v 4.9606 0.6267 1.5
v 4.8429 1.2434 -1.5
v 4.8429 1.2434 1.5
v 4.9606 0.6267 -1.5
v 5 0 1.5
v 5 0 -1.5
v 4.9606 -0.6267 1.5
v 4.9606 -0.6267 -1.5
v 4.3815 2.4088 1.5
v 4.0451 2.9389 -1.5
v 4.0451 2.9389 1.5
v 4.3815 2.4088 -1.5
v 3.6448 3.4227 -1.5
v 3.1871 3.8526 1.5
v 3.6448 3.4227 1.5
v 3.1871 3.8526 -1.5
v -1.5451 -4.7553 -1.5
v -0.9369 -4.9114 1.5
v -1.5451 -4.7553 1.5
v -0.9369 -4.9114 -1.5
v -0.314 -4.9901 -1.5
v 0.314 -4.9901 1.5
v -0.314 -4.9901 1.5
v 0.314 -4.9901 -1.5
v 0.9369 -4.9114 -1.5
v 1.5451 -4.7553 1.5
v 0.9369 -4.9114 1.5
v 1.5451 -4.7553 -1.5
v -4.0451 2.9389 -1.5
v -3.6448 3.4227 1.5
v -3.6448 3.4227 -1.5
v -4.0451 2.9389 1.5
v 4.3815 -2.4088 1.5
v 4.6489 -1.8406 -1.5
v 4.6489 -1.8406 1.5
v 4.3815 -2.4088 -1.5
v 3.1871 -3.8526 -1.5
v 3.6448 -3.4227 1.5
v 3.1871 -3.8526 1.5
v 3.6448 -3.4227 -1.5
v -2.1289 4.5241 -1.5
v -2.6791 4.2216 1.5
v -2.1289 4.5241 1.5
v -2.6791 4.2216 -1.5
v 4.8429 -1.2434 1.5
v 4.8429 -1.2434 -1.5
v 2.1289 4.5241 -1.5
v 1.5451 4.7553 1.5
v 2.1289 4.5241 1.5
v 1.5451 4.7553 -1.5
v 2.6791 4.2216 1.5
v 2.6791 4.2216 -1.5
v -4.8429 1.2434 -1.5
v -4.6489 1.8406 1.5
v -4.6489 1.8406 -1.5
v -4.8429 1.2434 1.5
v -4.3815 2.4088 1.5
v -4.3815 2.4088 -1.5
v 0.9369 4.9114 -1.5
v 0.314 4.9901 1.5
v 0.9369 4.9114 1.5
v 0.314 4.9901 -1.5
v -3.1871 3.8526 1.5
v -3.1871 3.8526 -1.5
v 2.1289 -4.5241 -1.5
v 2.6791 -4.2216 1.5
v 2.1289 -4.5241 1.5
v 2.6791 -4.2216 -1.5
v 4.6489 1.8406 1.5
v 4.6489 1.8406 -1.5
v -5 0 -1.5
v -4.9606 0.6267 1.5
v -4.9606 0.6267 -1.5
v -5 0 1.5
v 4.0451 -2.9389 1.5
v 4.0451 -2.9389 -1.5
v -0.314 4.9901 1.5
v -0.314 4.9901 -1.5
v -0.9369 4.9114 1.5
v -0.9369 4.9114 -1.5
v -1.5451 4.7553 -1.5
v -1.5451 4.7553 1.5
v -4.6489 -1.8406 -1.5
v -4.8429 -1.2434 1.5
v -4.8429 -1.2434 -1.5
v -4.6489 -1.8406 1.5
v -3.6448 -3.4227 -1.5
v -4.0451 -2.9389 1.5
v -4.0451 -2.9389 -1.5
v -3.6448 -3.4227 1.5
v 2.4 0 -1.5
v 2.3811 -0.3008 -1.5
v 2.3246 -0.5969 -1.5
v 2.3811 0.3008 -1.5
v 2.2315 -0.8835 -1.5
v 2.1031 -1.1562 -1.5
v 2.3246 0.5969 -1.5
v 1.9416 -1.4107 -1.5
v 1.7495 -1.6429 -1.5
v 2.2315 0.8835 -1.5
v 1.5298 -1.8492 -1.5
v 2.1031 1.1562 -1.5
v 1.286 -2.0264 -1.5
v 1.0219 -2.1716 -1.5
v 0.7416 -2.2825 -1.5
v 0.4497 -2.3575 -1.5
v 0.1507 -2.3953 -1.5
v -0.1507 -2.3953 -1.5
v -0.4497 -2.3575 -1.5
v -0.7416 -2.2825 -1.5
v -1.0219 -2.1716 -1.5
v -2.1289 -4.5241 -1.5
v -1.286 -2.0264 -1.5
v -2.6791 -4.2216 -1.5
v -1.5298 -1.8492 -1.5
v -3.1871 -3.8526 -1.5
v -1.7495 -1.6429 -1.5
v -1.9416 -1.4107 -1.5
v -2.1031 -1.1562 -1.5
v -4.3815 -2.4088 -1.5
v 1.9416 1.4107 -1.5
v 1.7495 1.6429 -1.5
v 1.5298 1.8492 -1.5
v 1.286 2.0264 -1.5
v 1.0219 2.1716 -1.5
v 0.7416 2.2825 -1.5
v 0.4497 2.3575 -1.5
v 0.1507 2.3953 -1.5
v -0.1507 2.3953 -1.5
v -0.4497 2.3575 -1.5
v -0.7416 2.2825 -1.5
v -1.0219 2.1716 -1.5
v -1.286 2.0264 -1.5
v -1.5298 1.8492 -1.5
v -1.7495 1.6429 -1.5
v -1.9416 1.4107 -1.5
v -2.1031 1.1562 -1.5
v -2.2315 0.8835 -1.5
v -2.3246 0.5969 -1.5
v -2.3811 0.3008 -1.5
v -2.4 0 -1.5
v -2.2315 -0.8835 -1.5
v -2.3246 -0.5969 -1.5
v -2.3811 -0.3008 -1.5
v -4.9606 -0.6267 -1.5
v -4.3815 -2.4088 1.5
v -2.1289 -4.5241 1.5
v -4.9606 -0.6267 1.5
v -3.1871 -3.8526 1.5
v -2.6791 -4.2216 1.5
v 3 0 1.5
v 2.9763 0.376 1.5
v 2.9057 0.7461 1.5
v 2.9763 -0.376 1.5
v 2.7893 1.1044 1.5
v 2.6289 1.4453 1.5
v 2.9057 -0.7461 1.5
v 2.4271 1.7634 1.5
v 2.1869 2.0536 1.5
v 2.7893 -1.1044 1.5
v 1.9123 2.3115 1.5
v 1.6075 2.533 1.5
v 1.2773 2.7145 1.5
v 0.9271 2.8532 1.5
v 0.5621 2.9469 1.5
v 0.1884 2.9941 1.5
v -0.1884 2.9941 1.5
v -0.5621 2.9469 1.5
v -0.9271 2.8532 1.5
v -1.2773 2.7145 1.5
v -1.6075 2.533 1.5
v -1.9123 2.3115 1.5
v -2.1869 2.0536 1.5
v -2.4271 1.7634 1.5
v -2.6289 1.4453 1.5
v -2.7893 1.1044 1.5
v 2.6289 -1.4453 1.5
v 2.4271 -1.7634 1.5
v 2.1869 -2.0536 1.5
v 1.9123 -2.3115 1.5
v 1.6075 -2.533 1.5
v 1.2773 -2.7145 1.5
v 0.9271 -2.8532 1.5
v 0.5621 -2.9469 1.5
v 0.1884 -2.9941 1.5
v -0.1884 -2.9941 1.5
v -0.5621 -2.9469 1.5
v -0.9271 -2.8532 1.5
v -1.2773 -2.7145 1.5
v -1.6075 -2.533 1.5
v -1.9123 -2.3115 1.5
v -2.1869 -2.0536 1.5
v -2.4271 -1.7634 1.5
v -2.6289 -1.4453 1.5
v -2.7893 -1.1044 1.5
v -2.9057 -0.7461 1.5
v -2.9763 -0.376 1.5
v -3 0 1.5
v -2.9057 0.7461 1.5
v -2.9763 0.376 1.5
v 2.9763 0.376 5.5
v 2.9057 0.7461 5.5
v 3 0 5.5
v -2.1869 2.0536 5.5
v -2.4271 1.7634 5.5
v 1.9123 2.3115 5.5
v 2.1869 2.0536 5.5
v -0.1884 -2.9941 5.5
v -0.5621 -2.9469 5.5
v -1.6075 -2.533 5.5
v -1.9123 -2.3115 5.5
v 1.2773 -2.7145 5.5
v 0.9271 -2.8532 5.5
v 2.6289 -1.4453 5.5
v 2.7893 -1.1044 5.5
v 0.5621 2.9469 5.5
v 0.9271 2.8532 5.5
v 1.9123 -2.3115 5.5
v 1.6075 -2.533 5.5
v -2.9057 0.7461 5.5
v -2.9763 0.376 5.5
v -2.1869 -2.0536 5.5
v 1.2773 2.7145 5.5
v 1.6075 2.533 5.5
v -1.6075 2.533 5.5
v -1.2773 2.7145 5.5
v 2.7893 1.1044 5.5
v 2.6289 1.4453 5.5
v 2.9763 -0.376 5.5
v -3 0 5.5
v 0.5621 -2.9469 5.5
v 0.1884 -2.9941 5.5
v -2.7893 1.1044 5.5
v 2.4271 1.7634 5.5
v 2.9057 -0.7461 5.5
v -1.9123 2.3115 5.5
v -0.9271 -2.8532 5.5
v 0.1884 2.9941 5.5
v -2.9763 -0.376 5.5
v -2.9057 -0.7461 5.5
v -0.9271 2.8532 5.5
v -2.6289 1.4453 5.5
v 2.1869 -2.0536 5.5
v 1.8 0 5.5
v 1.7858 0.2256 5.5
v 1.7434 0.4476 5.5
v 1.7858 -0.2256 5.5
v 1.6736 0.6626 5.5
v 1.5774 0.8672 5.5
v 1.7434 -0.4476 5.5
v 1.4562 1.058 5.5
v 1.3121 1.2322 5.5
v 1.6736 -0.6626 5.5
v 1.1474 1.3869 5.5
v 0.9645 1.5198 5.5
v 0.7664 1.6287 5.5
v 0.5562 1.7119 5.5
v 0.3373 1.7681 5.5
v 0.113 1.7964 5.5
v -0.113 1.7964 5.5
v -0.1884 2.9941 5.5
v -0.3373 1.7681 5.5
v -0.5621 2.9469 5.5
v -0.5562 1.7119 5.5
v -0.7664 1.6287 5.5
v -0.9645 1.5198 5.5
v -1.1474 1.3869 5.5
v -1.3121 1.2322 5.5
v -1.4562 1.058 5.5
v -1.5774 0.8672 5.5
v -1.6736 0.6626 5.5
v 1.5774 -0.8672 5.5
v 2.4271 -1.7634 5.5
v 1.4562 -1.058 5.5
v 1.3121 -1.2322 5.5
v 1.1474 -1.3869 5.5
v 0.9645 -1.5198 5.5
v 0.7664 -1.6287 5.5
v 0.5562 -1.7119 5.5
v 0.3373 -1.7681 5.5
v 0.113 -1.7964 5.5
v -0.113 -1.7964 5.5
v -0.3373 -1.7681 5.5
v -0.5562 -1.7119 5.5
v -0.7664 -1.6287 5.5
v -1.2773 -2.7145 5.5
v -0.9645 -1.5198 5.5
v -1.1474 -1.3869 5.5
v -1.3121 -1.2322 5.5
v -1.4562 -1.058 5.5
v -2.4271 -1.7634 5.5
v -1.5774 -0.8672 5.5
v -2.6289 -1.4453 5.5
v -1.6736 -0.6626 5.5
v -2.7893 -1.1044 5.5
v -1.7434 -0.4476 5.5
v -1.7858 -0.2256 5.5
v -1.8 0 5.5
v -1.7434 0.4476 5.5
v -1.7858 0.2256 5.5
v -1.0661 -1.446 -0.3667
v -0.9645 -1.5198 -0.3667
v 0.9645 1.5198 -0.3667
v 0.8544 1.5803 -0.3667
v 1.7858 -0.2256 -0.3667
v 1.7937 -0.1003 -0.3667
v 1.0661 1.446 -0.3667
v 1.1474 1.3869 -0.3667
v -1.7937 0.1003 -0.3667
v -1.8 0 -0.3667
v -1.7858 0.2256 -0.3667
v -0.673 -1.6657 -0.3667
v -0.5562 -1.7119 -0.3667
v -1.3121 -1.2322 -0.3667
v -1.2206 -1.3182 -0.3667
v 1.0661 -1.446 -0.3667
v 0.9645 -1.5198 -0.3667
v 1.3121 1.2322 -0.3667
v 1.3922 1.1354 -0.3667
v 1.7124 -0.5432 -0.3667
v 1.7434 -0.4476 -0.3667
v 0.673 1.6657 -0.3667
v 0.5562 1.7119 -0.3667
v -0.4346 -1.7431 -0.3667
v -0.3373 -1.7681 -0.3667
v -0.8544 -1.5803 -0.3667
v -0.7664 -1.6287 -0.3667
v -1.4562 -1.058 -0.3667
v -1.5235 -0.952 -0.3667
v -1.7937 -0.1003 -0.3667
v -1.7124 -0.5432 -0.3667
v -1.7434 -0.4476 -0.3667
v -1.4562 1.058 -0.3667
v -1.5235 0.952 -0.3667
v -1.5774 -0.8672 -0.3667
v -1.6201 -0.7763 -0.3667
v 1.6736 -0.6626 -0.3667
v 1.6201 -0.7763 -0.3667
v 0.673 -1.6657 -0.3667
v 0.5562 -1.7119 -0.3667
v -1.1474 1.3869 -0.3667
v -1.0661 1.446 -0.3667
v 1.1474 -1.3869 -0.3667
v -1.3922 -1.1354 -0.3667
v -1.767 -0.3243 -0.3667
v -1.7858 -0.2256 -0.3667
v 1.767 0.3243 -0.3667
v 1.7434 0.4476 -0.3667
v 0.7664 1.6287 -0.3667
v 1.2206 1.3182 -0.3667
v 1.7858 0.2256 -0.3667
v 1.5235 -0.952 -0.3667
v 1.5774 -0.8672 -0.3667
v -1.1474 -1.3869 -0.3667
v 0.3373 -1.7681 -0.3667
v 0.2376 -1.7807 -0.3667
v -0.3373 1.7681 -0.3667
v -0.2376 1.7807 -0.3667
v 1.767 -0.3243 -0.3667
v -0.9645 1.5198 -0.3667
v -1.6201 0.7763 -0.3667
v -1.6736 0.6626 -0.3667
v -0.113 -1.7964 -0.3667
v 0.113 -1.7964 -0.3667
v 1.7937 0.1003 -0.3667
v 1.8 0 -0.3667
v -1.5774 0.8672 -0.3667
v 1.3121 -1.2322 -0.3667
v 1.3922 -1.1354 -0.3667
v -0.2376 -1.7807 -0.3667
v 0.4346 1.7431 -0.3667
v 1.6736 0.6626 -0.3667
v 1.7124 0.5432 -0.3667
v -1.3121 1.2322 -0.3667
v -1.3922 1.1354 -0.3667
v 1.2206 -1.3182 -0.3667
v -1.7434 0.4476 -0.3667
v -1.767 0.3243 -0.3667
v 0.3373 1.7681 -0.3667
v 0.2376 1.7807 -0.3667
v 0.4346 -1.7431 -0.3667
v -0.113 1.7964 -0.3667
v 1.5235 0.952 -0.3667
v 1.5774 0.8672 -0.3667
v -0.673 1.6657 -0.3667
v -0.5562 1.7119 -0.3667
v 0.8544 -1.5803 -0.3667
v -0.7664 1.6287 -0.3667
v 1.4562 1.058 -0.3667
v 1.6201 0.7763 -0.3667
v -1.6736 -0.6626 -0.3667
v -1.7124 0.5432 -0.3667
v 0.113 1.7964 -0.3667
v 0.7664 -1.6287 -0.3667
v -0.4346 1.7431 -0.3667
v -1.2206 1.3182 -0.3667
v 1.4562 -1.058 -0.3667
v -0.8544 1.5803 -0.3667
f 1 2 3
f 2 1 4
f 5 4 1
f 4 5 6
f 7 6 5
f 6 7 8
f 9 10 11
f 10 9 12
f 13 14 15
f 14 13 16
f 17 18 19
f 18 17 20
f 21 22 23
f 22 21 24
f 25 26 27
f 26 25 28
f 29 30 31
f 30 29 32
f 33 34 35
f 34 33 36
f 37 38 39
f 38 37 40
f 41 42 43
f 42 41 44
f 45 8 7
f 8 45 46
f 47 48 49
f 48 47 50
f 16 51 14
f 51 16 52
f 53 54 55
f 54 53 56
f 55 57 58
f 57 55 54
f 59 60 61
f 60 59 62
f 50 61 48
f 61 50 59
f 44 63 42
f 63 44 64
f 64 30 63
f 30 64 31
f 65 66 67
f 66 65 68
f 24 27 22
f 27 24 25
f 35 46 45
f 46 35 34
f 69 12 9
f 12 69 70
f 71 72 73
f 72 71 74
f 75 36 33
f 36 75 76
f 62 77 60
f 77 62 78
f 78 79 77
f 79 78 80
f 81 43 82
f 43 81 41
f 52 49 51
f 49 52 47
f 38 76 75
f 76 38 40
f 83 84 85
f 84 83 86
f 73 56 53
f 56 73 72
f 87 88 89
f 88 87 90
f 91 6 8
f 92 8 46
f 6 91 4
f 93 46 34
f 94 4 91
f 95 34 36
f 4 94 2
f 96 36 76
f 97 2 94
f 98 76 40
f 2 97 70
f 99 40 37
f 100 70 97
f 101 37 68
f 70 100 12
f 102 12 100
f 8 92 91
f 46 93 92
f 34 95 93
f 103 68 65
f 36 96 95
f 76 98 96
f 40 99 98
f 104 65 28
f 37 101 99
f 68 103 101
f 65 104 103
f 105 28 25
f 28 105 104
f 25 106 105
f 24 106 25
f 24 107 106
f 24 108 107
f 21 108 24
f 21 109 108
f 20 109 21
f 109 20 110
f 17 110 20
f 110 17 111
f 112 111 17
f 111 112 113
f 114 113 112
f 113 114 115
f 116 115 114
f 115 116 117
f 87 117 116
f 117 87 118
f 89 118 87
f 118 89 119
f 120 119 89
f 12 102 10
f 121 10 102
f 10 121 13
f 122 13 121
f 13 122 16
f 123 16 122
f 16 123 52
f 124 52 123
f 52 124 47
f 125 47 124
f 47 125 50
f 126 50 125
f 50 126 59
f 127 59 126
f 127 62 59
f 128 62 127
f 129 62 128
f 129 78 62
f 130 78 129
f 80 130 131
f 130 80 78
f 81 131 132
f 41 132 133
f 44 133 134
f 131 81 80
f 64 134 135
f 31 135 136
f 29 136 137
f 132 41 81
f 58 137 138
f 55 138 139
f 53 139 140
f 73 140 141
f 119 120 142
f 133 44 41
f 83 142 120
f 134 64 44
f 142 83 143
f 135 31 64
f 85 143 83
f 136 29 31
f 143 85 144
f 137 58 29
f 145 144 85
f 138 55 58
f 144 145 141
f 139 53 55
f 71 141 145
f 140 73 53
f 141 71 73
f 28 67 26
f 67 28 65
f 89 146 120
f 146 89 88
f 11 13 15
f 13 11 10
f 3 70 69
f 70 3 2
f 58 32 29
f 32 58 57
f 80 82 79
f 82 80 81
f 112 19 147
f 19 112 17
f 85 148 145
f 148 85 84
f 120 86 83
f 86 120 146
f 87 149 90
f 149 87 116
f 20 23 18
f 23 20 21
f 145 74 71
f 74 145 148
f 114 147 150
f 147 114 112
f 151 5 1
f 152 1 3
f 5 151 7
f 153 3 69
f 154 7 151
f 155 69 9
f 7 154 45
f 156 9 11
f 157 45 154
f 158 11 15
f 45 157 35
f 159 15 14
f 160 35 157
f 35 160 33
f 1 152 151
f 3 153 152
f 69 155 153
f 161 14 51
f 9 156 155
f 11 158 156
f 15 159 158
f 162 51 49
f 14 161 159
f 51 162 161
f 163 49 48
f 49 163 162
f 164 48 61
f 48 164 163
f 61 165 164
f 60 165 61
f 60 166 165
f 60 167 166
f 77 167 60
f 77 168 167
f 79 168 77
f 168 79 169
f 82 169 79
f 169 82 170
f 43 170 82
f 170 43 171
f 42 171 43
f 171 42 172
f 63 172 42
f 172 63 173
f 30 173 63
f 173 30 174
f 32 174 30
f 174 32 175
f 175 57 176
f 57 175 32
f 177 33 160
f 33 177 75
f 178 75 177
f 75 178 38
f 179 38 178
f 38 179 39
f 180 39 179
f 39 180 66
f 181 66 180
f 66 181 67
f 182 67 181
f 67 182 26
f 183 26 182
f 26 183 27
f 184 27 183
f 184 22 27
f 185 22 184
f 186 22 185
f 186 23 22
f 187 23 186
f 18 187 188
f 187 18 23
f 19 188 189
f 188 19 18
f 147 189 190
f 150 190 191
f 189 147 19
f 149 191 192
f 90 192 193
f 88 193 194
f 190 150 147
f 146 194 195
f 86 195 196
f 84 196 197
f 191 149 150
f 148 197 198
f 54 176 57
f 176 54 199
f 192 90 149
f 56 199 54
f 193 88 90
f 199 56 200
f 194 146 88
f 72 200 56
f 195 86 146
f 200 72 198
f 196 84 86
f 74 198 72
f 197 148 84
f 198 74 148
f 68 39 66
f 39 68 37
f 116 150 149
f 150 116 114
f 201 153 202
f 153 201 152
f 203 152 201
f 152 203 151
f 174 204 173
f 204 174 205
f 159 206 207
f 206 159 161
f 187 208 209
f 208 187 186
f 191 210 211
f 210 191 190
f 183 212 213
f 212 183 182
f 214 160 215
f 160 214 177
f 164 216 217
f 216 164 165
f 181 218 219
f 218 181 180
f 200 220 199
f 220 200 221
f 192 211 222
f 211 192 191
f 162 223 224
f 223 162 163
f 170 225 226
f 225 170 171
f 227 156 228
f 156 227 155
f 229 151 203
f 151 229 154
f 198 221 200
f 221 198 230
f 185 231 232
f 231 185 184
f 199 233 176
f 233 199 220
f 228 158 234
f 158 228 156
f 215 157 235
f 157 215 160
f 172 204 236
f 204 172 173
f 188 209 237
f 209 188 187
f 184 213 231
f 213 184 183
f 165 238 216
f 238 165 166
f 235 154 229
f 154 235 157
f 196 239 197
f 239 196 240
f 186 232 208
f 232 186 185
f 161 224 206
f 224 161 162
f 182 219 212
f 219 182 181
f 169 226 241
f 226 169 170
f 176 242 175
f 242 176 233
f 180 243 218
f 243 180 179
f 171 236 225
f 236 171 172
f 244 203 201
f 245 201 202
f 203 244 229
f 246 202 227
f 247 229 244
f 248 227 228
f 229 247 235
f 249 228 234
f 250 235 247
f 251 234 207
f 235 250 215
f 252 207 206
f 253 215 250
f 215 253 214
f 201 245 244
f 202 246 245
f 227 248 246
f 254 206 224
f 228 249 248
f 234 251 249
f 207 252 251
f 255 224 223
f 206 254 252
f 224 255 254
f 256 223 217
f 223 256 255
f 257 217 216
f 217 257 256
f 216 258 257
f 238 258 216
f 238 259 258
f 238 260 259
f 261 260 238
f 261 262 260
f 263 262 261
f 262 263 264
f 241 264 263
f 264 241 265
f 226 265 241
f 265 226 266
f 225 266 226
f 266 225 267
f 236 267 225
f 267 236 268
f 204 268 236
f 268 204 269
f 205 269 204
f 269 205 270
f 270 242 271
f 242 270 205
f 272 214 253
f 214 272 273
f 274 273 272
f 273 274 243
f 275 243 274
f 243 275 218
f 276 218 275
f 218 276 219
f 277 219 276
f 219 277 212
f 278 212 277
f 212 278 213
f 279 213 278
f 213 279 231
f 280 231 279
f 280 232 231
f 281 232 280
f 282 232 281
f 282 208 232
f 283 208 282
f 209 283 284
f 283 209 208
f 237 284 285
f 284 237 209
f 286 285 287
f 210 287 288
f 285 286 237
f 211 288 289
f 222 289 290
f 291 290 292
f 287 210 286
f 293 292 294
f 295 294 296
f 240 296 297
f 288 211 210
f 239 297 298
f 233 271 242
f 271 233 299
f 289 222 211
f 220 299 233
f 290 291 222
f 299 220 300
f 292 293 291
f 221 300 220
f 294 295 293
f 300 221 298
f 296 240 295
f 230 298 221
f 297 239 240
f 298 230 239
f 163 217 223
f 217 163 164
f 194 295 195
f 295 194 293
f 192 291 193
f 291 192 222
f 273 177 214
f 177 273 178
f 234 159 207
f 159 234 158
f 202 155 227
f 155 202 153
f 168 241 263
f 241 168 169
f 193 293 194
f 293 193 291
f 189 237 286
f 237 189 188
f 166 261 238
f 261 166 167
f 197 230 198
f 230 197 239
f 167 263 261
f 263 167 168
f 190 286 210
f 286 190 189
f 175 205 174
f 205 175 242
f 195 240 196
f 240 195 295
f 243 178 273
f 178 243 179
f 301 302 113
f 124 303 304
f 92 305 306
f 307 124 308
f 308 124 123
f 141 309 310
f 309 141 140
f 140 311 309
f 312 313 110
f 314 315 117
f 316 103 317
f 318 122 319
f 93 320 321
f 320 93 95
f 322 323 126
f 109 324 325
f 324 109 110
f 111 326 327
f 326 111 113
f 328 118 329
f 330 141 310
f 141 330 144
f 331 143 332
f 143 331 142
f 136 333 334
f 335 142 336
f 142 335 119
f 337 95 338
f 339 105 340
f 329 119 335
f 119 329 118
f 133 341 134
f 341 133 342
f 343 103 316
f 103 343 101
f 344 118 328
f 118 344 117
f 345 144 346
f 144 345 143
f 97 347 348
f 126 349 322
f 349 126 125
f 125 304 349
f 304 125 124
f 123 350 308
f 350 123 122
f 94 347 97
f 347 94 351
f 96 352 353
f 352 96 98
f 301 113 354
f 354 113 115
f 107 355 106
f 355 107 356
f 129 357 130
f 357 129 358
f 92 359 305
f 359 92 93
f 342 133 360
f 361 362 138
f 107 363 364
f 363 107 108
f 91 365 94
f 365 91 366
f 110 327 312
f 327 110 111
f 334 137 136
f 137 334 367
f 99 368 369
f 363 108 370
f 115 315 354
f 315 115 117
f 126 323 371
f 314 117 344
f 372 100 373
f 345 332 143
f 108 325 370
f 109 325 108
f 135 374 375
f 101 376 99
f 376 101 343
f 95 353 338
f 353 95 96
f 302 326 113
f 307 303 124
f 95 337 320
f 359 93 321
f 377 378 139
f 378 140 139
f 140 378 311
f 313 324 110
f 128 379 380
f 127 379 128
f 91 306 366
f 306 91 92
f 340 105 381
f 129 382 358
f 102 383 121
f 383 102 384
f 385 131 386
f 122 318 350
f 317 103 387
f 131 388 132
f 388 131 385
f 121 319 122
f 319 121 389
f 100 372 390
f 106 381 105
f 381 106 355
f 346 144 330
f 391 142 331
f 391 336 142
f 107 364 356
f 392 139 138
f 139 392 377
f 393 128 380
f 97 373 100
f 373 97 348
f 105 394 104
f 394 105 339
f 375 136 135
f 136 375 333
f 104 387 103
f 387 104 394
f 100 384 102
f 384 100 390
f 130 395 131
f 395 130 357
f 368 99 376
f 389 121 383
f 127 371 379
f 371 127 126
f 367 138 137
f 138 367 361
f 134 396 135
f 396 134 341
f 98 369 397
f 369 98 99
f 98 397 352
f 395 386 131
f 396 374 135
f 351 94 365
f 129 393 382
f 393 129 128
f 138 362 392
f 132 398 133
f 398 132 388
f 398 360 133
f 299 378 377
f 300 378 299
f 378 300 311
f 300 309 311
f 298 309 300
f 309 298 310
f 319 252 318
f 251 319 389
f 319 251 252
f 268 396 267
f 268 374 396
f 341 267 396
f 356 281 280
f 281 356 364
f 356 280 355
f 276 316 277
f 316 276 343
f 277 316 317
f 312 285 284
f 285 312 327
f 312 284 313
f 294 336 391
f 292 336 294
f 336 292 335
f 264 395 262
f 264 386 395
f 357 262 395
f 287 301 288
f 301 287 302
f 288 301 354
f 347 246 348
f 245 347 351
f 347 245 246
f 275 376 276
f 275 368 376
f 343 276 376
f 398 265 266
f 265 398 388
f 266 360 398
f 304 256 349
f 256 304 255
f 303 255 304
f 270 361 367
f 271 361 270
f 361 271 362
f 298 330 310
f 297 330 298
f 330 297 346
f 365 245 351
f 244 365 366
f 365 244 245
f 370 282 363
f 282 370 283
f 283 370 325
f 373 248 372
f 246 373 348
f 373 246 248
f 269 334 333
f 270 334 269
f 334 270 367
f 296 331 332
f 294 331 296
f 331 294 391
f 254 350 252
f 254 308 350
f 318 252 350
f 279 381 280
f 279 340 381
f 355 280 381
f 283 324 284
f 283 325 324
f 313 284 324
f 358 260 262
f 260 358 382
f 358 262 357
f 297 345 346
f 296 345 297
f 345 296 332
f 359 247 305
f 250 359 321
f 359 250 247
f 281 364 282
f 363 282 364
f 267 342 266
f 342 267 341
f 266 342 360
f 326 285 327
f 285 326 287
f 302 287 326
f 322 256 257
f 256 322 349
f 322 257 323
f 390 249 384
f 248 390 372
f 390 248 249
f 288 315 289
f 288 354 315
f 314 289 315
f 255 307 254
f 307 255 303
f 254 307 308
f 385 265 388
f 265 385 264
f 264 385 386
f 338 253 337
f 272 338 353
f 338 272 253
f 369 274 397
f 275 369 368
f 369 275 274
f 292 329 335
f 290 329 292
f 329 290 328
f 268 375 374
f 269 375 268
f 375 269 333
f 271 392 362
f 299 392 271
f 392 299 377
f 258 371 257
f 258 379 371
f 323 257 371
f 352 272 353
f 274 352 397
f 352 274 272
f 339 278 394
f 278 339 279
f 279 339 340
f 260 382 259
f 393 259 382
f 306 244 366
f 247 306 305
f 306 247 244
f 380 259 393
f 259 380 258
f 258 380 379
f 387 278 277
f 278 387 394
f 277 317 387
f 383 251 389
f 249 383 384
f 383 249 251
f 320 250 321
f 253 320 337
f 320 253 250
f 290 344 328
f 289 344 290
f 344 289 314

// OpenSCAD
$fn = 50;


difference() {
	union() {
		translate(v = [0, 0, -1.5000000000]) {
			cylinder(h = 3, r = 5.0000000000);
		}
		translate(v = [0, 0, -1.5000000000]) {
			cylinder(h = 7, r = 3.0000000000);
		}
	}
	union() {
		translate(v = [0, 0, -1.5000000000]) {
			rotate(a = [0, 180, 0]) {
				difference() {
					union() {
						translate(v = [0, 0, -1.7000000000]) {
							cylinder(h = 1.7000000000, r1 = 1.5000000000, r2 = 2.4000000000);
						}
						translate(v = [0, 0, -7.0000000000]) {
							cylinder(h = 7, r = 1.5000000000);
						}
						translate(v = [0, 0, -7.0000000000]) {
							cylinder(h = 7, r = 1.8000000000);
						}
						translate(v = [0, 0, -7.0000000000]) {
							cylinder(h = 7, r = 1.5000000000);
						}
					}
					union();
				}
			}
		}
		translate(v = [0, 0, -50.0000000000]) {
			cylinder(h = 100, r = 1.5000000000);
		}
	}
}
